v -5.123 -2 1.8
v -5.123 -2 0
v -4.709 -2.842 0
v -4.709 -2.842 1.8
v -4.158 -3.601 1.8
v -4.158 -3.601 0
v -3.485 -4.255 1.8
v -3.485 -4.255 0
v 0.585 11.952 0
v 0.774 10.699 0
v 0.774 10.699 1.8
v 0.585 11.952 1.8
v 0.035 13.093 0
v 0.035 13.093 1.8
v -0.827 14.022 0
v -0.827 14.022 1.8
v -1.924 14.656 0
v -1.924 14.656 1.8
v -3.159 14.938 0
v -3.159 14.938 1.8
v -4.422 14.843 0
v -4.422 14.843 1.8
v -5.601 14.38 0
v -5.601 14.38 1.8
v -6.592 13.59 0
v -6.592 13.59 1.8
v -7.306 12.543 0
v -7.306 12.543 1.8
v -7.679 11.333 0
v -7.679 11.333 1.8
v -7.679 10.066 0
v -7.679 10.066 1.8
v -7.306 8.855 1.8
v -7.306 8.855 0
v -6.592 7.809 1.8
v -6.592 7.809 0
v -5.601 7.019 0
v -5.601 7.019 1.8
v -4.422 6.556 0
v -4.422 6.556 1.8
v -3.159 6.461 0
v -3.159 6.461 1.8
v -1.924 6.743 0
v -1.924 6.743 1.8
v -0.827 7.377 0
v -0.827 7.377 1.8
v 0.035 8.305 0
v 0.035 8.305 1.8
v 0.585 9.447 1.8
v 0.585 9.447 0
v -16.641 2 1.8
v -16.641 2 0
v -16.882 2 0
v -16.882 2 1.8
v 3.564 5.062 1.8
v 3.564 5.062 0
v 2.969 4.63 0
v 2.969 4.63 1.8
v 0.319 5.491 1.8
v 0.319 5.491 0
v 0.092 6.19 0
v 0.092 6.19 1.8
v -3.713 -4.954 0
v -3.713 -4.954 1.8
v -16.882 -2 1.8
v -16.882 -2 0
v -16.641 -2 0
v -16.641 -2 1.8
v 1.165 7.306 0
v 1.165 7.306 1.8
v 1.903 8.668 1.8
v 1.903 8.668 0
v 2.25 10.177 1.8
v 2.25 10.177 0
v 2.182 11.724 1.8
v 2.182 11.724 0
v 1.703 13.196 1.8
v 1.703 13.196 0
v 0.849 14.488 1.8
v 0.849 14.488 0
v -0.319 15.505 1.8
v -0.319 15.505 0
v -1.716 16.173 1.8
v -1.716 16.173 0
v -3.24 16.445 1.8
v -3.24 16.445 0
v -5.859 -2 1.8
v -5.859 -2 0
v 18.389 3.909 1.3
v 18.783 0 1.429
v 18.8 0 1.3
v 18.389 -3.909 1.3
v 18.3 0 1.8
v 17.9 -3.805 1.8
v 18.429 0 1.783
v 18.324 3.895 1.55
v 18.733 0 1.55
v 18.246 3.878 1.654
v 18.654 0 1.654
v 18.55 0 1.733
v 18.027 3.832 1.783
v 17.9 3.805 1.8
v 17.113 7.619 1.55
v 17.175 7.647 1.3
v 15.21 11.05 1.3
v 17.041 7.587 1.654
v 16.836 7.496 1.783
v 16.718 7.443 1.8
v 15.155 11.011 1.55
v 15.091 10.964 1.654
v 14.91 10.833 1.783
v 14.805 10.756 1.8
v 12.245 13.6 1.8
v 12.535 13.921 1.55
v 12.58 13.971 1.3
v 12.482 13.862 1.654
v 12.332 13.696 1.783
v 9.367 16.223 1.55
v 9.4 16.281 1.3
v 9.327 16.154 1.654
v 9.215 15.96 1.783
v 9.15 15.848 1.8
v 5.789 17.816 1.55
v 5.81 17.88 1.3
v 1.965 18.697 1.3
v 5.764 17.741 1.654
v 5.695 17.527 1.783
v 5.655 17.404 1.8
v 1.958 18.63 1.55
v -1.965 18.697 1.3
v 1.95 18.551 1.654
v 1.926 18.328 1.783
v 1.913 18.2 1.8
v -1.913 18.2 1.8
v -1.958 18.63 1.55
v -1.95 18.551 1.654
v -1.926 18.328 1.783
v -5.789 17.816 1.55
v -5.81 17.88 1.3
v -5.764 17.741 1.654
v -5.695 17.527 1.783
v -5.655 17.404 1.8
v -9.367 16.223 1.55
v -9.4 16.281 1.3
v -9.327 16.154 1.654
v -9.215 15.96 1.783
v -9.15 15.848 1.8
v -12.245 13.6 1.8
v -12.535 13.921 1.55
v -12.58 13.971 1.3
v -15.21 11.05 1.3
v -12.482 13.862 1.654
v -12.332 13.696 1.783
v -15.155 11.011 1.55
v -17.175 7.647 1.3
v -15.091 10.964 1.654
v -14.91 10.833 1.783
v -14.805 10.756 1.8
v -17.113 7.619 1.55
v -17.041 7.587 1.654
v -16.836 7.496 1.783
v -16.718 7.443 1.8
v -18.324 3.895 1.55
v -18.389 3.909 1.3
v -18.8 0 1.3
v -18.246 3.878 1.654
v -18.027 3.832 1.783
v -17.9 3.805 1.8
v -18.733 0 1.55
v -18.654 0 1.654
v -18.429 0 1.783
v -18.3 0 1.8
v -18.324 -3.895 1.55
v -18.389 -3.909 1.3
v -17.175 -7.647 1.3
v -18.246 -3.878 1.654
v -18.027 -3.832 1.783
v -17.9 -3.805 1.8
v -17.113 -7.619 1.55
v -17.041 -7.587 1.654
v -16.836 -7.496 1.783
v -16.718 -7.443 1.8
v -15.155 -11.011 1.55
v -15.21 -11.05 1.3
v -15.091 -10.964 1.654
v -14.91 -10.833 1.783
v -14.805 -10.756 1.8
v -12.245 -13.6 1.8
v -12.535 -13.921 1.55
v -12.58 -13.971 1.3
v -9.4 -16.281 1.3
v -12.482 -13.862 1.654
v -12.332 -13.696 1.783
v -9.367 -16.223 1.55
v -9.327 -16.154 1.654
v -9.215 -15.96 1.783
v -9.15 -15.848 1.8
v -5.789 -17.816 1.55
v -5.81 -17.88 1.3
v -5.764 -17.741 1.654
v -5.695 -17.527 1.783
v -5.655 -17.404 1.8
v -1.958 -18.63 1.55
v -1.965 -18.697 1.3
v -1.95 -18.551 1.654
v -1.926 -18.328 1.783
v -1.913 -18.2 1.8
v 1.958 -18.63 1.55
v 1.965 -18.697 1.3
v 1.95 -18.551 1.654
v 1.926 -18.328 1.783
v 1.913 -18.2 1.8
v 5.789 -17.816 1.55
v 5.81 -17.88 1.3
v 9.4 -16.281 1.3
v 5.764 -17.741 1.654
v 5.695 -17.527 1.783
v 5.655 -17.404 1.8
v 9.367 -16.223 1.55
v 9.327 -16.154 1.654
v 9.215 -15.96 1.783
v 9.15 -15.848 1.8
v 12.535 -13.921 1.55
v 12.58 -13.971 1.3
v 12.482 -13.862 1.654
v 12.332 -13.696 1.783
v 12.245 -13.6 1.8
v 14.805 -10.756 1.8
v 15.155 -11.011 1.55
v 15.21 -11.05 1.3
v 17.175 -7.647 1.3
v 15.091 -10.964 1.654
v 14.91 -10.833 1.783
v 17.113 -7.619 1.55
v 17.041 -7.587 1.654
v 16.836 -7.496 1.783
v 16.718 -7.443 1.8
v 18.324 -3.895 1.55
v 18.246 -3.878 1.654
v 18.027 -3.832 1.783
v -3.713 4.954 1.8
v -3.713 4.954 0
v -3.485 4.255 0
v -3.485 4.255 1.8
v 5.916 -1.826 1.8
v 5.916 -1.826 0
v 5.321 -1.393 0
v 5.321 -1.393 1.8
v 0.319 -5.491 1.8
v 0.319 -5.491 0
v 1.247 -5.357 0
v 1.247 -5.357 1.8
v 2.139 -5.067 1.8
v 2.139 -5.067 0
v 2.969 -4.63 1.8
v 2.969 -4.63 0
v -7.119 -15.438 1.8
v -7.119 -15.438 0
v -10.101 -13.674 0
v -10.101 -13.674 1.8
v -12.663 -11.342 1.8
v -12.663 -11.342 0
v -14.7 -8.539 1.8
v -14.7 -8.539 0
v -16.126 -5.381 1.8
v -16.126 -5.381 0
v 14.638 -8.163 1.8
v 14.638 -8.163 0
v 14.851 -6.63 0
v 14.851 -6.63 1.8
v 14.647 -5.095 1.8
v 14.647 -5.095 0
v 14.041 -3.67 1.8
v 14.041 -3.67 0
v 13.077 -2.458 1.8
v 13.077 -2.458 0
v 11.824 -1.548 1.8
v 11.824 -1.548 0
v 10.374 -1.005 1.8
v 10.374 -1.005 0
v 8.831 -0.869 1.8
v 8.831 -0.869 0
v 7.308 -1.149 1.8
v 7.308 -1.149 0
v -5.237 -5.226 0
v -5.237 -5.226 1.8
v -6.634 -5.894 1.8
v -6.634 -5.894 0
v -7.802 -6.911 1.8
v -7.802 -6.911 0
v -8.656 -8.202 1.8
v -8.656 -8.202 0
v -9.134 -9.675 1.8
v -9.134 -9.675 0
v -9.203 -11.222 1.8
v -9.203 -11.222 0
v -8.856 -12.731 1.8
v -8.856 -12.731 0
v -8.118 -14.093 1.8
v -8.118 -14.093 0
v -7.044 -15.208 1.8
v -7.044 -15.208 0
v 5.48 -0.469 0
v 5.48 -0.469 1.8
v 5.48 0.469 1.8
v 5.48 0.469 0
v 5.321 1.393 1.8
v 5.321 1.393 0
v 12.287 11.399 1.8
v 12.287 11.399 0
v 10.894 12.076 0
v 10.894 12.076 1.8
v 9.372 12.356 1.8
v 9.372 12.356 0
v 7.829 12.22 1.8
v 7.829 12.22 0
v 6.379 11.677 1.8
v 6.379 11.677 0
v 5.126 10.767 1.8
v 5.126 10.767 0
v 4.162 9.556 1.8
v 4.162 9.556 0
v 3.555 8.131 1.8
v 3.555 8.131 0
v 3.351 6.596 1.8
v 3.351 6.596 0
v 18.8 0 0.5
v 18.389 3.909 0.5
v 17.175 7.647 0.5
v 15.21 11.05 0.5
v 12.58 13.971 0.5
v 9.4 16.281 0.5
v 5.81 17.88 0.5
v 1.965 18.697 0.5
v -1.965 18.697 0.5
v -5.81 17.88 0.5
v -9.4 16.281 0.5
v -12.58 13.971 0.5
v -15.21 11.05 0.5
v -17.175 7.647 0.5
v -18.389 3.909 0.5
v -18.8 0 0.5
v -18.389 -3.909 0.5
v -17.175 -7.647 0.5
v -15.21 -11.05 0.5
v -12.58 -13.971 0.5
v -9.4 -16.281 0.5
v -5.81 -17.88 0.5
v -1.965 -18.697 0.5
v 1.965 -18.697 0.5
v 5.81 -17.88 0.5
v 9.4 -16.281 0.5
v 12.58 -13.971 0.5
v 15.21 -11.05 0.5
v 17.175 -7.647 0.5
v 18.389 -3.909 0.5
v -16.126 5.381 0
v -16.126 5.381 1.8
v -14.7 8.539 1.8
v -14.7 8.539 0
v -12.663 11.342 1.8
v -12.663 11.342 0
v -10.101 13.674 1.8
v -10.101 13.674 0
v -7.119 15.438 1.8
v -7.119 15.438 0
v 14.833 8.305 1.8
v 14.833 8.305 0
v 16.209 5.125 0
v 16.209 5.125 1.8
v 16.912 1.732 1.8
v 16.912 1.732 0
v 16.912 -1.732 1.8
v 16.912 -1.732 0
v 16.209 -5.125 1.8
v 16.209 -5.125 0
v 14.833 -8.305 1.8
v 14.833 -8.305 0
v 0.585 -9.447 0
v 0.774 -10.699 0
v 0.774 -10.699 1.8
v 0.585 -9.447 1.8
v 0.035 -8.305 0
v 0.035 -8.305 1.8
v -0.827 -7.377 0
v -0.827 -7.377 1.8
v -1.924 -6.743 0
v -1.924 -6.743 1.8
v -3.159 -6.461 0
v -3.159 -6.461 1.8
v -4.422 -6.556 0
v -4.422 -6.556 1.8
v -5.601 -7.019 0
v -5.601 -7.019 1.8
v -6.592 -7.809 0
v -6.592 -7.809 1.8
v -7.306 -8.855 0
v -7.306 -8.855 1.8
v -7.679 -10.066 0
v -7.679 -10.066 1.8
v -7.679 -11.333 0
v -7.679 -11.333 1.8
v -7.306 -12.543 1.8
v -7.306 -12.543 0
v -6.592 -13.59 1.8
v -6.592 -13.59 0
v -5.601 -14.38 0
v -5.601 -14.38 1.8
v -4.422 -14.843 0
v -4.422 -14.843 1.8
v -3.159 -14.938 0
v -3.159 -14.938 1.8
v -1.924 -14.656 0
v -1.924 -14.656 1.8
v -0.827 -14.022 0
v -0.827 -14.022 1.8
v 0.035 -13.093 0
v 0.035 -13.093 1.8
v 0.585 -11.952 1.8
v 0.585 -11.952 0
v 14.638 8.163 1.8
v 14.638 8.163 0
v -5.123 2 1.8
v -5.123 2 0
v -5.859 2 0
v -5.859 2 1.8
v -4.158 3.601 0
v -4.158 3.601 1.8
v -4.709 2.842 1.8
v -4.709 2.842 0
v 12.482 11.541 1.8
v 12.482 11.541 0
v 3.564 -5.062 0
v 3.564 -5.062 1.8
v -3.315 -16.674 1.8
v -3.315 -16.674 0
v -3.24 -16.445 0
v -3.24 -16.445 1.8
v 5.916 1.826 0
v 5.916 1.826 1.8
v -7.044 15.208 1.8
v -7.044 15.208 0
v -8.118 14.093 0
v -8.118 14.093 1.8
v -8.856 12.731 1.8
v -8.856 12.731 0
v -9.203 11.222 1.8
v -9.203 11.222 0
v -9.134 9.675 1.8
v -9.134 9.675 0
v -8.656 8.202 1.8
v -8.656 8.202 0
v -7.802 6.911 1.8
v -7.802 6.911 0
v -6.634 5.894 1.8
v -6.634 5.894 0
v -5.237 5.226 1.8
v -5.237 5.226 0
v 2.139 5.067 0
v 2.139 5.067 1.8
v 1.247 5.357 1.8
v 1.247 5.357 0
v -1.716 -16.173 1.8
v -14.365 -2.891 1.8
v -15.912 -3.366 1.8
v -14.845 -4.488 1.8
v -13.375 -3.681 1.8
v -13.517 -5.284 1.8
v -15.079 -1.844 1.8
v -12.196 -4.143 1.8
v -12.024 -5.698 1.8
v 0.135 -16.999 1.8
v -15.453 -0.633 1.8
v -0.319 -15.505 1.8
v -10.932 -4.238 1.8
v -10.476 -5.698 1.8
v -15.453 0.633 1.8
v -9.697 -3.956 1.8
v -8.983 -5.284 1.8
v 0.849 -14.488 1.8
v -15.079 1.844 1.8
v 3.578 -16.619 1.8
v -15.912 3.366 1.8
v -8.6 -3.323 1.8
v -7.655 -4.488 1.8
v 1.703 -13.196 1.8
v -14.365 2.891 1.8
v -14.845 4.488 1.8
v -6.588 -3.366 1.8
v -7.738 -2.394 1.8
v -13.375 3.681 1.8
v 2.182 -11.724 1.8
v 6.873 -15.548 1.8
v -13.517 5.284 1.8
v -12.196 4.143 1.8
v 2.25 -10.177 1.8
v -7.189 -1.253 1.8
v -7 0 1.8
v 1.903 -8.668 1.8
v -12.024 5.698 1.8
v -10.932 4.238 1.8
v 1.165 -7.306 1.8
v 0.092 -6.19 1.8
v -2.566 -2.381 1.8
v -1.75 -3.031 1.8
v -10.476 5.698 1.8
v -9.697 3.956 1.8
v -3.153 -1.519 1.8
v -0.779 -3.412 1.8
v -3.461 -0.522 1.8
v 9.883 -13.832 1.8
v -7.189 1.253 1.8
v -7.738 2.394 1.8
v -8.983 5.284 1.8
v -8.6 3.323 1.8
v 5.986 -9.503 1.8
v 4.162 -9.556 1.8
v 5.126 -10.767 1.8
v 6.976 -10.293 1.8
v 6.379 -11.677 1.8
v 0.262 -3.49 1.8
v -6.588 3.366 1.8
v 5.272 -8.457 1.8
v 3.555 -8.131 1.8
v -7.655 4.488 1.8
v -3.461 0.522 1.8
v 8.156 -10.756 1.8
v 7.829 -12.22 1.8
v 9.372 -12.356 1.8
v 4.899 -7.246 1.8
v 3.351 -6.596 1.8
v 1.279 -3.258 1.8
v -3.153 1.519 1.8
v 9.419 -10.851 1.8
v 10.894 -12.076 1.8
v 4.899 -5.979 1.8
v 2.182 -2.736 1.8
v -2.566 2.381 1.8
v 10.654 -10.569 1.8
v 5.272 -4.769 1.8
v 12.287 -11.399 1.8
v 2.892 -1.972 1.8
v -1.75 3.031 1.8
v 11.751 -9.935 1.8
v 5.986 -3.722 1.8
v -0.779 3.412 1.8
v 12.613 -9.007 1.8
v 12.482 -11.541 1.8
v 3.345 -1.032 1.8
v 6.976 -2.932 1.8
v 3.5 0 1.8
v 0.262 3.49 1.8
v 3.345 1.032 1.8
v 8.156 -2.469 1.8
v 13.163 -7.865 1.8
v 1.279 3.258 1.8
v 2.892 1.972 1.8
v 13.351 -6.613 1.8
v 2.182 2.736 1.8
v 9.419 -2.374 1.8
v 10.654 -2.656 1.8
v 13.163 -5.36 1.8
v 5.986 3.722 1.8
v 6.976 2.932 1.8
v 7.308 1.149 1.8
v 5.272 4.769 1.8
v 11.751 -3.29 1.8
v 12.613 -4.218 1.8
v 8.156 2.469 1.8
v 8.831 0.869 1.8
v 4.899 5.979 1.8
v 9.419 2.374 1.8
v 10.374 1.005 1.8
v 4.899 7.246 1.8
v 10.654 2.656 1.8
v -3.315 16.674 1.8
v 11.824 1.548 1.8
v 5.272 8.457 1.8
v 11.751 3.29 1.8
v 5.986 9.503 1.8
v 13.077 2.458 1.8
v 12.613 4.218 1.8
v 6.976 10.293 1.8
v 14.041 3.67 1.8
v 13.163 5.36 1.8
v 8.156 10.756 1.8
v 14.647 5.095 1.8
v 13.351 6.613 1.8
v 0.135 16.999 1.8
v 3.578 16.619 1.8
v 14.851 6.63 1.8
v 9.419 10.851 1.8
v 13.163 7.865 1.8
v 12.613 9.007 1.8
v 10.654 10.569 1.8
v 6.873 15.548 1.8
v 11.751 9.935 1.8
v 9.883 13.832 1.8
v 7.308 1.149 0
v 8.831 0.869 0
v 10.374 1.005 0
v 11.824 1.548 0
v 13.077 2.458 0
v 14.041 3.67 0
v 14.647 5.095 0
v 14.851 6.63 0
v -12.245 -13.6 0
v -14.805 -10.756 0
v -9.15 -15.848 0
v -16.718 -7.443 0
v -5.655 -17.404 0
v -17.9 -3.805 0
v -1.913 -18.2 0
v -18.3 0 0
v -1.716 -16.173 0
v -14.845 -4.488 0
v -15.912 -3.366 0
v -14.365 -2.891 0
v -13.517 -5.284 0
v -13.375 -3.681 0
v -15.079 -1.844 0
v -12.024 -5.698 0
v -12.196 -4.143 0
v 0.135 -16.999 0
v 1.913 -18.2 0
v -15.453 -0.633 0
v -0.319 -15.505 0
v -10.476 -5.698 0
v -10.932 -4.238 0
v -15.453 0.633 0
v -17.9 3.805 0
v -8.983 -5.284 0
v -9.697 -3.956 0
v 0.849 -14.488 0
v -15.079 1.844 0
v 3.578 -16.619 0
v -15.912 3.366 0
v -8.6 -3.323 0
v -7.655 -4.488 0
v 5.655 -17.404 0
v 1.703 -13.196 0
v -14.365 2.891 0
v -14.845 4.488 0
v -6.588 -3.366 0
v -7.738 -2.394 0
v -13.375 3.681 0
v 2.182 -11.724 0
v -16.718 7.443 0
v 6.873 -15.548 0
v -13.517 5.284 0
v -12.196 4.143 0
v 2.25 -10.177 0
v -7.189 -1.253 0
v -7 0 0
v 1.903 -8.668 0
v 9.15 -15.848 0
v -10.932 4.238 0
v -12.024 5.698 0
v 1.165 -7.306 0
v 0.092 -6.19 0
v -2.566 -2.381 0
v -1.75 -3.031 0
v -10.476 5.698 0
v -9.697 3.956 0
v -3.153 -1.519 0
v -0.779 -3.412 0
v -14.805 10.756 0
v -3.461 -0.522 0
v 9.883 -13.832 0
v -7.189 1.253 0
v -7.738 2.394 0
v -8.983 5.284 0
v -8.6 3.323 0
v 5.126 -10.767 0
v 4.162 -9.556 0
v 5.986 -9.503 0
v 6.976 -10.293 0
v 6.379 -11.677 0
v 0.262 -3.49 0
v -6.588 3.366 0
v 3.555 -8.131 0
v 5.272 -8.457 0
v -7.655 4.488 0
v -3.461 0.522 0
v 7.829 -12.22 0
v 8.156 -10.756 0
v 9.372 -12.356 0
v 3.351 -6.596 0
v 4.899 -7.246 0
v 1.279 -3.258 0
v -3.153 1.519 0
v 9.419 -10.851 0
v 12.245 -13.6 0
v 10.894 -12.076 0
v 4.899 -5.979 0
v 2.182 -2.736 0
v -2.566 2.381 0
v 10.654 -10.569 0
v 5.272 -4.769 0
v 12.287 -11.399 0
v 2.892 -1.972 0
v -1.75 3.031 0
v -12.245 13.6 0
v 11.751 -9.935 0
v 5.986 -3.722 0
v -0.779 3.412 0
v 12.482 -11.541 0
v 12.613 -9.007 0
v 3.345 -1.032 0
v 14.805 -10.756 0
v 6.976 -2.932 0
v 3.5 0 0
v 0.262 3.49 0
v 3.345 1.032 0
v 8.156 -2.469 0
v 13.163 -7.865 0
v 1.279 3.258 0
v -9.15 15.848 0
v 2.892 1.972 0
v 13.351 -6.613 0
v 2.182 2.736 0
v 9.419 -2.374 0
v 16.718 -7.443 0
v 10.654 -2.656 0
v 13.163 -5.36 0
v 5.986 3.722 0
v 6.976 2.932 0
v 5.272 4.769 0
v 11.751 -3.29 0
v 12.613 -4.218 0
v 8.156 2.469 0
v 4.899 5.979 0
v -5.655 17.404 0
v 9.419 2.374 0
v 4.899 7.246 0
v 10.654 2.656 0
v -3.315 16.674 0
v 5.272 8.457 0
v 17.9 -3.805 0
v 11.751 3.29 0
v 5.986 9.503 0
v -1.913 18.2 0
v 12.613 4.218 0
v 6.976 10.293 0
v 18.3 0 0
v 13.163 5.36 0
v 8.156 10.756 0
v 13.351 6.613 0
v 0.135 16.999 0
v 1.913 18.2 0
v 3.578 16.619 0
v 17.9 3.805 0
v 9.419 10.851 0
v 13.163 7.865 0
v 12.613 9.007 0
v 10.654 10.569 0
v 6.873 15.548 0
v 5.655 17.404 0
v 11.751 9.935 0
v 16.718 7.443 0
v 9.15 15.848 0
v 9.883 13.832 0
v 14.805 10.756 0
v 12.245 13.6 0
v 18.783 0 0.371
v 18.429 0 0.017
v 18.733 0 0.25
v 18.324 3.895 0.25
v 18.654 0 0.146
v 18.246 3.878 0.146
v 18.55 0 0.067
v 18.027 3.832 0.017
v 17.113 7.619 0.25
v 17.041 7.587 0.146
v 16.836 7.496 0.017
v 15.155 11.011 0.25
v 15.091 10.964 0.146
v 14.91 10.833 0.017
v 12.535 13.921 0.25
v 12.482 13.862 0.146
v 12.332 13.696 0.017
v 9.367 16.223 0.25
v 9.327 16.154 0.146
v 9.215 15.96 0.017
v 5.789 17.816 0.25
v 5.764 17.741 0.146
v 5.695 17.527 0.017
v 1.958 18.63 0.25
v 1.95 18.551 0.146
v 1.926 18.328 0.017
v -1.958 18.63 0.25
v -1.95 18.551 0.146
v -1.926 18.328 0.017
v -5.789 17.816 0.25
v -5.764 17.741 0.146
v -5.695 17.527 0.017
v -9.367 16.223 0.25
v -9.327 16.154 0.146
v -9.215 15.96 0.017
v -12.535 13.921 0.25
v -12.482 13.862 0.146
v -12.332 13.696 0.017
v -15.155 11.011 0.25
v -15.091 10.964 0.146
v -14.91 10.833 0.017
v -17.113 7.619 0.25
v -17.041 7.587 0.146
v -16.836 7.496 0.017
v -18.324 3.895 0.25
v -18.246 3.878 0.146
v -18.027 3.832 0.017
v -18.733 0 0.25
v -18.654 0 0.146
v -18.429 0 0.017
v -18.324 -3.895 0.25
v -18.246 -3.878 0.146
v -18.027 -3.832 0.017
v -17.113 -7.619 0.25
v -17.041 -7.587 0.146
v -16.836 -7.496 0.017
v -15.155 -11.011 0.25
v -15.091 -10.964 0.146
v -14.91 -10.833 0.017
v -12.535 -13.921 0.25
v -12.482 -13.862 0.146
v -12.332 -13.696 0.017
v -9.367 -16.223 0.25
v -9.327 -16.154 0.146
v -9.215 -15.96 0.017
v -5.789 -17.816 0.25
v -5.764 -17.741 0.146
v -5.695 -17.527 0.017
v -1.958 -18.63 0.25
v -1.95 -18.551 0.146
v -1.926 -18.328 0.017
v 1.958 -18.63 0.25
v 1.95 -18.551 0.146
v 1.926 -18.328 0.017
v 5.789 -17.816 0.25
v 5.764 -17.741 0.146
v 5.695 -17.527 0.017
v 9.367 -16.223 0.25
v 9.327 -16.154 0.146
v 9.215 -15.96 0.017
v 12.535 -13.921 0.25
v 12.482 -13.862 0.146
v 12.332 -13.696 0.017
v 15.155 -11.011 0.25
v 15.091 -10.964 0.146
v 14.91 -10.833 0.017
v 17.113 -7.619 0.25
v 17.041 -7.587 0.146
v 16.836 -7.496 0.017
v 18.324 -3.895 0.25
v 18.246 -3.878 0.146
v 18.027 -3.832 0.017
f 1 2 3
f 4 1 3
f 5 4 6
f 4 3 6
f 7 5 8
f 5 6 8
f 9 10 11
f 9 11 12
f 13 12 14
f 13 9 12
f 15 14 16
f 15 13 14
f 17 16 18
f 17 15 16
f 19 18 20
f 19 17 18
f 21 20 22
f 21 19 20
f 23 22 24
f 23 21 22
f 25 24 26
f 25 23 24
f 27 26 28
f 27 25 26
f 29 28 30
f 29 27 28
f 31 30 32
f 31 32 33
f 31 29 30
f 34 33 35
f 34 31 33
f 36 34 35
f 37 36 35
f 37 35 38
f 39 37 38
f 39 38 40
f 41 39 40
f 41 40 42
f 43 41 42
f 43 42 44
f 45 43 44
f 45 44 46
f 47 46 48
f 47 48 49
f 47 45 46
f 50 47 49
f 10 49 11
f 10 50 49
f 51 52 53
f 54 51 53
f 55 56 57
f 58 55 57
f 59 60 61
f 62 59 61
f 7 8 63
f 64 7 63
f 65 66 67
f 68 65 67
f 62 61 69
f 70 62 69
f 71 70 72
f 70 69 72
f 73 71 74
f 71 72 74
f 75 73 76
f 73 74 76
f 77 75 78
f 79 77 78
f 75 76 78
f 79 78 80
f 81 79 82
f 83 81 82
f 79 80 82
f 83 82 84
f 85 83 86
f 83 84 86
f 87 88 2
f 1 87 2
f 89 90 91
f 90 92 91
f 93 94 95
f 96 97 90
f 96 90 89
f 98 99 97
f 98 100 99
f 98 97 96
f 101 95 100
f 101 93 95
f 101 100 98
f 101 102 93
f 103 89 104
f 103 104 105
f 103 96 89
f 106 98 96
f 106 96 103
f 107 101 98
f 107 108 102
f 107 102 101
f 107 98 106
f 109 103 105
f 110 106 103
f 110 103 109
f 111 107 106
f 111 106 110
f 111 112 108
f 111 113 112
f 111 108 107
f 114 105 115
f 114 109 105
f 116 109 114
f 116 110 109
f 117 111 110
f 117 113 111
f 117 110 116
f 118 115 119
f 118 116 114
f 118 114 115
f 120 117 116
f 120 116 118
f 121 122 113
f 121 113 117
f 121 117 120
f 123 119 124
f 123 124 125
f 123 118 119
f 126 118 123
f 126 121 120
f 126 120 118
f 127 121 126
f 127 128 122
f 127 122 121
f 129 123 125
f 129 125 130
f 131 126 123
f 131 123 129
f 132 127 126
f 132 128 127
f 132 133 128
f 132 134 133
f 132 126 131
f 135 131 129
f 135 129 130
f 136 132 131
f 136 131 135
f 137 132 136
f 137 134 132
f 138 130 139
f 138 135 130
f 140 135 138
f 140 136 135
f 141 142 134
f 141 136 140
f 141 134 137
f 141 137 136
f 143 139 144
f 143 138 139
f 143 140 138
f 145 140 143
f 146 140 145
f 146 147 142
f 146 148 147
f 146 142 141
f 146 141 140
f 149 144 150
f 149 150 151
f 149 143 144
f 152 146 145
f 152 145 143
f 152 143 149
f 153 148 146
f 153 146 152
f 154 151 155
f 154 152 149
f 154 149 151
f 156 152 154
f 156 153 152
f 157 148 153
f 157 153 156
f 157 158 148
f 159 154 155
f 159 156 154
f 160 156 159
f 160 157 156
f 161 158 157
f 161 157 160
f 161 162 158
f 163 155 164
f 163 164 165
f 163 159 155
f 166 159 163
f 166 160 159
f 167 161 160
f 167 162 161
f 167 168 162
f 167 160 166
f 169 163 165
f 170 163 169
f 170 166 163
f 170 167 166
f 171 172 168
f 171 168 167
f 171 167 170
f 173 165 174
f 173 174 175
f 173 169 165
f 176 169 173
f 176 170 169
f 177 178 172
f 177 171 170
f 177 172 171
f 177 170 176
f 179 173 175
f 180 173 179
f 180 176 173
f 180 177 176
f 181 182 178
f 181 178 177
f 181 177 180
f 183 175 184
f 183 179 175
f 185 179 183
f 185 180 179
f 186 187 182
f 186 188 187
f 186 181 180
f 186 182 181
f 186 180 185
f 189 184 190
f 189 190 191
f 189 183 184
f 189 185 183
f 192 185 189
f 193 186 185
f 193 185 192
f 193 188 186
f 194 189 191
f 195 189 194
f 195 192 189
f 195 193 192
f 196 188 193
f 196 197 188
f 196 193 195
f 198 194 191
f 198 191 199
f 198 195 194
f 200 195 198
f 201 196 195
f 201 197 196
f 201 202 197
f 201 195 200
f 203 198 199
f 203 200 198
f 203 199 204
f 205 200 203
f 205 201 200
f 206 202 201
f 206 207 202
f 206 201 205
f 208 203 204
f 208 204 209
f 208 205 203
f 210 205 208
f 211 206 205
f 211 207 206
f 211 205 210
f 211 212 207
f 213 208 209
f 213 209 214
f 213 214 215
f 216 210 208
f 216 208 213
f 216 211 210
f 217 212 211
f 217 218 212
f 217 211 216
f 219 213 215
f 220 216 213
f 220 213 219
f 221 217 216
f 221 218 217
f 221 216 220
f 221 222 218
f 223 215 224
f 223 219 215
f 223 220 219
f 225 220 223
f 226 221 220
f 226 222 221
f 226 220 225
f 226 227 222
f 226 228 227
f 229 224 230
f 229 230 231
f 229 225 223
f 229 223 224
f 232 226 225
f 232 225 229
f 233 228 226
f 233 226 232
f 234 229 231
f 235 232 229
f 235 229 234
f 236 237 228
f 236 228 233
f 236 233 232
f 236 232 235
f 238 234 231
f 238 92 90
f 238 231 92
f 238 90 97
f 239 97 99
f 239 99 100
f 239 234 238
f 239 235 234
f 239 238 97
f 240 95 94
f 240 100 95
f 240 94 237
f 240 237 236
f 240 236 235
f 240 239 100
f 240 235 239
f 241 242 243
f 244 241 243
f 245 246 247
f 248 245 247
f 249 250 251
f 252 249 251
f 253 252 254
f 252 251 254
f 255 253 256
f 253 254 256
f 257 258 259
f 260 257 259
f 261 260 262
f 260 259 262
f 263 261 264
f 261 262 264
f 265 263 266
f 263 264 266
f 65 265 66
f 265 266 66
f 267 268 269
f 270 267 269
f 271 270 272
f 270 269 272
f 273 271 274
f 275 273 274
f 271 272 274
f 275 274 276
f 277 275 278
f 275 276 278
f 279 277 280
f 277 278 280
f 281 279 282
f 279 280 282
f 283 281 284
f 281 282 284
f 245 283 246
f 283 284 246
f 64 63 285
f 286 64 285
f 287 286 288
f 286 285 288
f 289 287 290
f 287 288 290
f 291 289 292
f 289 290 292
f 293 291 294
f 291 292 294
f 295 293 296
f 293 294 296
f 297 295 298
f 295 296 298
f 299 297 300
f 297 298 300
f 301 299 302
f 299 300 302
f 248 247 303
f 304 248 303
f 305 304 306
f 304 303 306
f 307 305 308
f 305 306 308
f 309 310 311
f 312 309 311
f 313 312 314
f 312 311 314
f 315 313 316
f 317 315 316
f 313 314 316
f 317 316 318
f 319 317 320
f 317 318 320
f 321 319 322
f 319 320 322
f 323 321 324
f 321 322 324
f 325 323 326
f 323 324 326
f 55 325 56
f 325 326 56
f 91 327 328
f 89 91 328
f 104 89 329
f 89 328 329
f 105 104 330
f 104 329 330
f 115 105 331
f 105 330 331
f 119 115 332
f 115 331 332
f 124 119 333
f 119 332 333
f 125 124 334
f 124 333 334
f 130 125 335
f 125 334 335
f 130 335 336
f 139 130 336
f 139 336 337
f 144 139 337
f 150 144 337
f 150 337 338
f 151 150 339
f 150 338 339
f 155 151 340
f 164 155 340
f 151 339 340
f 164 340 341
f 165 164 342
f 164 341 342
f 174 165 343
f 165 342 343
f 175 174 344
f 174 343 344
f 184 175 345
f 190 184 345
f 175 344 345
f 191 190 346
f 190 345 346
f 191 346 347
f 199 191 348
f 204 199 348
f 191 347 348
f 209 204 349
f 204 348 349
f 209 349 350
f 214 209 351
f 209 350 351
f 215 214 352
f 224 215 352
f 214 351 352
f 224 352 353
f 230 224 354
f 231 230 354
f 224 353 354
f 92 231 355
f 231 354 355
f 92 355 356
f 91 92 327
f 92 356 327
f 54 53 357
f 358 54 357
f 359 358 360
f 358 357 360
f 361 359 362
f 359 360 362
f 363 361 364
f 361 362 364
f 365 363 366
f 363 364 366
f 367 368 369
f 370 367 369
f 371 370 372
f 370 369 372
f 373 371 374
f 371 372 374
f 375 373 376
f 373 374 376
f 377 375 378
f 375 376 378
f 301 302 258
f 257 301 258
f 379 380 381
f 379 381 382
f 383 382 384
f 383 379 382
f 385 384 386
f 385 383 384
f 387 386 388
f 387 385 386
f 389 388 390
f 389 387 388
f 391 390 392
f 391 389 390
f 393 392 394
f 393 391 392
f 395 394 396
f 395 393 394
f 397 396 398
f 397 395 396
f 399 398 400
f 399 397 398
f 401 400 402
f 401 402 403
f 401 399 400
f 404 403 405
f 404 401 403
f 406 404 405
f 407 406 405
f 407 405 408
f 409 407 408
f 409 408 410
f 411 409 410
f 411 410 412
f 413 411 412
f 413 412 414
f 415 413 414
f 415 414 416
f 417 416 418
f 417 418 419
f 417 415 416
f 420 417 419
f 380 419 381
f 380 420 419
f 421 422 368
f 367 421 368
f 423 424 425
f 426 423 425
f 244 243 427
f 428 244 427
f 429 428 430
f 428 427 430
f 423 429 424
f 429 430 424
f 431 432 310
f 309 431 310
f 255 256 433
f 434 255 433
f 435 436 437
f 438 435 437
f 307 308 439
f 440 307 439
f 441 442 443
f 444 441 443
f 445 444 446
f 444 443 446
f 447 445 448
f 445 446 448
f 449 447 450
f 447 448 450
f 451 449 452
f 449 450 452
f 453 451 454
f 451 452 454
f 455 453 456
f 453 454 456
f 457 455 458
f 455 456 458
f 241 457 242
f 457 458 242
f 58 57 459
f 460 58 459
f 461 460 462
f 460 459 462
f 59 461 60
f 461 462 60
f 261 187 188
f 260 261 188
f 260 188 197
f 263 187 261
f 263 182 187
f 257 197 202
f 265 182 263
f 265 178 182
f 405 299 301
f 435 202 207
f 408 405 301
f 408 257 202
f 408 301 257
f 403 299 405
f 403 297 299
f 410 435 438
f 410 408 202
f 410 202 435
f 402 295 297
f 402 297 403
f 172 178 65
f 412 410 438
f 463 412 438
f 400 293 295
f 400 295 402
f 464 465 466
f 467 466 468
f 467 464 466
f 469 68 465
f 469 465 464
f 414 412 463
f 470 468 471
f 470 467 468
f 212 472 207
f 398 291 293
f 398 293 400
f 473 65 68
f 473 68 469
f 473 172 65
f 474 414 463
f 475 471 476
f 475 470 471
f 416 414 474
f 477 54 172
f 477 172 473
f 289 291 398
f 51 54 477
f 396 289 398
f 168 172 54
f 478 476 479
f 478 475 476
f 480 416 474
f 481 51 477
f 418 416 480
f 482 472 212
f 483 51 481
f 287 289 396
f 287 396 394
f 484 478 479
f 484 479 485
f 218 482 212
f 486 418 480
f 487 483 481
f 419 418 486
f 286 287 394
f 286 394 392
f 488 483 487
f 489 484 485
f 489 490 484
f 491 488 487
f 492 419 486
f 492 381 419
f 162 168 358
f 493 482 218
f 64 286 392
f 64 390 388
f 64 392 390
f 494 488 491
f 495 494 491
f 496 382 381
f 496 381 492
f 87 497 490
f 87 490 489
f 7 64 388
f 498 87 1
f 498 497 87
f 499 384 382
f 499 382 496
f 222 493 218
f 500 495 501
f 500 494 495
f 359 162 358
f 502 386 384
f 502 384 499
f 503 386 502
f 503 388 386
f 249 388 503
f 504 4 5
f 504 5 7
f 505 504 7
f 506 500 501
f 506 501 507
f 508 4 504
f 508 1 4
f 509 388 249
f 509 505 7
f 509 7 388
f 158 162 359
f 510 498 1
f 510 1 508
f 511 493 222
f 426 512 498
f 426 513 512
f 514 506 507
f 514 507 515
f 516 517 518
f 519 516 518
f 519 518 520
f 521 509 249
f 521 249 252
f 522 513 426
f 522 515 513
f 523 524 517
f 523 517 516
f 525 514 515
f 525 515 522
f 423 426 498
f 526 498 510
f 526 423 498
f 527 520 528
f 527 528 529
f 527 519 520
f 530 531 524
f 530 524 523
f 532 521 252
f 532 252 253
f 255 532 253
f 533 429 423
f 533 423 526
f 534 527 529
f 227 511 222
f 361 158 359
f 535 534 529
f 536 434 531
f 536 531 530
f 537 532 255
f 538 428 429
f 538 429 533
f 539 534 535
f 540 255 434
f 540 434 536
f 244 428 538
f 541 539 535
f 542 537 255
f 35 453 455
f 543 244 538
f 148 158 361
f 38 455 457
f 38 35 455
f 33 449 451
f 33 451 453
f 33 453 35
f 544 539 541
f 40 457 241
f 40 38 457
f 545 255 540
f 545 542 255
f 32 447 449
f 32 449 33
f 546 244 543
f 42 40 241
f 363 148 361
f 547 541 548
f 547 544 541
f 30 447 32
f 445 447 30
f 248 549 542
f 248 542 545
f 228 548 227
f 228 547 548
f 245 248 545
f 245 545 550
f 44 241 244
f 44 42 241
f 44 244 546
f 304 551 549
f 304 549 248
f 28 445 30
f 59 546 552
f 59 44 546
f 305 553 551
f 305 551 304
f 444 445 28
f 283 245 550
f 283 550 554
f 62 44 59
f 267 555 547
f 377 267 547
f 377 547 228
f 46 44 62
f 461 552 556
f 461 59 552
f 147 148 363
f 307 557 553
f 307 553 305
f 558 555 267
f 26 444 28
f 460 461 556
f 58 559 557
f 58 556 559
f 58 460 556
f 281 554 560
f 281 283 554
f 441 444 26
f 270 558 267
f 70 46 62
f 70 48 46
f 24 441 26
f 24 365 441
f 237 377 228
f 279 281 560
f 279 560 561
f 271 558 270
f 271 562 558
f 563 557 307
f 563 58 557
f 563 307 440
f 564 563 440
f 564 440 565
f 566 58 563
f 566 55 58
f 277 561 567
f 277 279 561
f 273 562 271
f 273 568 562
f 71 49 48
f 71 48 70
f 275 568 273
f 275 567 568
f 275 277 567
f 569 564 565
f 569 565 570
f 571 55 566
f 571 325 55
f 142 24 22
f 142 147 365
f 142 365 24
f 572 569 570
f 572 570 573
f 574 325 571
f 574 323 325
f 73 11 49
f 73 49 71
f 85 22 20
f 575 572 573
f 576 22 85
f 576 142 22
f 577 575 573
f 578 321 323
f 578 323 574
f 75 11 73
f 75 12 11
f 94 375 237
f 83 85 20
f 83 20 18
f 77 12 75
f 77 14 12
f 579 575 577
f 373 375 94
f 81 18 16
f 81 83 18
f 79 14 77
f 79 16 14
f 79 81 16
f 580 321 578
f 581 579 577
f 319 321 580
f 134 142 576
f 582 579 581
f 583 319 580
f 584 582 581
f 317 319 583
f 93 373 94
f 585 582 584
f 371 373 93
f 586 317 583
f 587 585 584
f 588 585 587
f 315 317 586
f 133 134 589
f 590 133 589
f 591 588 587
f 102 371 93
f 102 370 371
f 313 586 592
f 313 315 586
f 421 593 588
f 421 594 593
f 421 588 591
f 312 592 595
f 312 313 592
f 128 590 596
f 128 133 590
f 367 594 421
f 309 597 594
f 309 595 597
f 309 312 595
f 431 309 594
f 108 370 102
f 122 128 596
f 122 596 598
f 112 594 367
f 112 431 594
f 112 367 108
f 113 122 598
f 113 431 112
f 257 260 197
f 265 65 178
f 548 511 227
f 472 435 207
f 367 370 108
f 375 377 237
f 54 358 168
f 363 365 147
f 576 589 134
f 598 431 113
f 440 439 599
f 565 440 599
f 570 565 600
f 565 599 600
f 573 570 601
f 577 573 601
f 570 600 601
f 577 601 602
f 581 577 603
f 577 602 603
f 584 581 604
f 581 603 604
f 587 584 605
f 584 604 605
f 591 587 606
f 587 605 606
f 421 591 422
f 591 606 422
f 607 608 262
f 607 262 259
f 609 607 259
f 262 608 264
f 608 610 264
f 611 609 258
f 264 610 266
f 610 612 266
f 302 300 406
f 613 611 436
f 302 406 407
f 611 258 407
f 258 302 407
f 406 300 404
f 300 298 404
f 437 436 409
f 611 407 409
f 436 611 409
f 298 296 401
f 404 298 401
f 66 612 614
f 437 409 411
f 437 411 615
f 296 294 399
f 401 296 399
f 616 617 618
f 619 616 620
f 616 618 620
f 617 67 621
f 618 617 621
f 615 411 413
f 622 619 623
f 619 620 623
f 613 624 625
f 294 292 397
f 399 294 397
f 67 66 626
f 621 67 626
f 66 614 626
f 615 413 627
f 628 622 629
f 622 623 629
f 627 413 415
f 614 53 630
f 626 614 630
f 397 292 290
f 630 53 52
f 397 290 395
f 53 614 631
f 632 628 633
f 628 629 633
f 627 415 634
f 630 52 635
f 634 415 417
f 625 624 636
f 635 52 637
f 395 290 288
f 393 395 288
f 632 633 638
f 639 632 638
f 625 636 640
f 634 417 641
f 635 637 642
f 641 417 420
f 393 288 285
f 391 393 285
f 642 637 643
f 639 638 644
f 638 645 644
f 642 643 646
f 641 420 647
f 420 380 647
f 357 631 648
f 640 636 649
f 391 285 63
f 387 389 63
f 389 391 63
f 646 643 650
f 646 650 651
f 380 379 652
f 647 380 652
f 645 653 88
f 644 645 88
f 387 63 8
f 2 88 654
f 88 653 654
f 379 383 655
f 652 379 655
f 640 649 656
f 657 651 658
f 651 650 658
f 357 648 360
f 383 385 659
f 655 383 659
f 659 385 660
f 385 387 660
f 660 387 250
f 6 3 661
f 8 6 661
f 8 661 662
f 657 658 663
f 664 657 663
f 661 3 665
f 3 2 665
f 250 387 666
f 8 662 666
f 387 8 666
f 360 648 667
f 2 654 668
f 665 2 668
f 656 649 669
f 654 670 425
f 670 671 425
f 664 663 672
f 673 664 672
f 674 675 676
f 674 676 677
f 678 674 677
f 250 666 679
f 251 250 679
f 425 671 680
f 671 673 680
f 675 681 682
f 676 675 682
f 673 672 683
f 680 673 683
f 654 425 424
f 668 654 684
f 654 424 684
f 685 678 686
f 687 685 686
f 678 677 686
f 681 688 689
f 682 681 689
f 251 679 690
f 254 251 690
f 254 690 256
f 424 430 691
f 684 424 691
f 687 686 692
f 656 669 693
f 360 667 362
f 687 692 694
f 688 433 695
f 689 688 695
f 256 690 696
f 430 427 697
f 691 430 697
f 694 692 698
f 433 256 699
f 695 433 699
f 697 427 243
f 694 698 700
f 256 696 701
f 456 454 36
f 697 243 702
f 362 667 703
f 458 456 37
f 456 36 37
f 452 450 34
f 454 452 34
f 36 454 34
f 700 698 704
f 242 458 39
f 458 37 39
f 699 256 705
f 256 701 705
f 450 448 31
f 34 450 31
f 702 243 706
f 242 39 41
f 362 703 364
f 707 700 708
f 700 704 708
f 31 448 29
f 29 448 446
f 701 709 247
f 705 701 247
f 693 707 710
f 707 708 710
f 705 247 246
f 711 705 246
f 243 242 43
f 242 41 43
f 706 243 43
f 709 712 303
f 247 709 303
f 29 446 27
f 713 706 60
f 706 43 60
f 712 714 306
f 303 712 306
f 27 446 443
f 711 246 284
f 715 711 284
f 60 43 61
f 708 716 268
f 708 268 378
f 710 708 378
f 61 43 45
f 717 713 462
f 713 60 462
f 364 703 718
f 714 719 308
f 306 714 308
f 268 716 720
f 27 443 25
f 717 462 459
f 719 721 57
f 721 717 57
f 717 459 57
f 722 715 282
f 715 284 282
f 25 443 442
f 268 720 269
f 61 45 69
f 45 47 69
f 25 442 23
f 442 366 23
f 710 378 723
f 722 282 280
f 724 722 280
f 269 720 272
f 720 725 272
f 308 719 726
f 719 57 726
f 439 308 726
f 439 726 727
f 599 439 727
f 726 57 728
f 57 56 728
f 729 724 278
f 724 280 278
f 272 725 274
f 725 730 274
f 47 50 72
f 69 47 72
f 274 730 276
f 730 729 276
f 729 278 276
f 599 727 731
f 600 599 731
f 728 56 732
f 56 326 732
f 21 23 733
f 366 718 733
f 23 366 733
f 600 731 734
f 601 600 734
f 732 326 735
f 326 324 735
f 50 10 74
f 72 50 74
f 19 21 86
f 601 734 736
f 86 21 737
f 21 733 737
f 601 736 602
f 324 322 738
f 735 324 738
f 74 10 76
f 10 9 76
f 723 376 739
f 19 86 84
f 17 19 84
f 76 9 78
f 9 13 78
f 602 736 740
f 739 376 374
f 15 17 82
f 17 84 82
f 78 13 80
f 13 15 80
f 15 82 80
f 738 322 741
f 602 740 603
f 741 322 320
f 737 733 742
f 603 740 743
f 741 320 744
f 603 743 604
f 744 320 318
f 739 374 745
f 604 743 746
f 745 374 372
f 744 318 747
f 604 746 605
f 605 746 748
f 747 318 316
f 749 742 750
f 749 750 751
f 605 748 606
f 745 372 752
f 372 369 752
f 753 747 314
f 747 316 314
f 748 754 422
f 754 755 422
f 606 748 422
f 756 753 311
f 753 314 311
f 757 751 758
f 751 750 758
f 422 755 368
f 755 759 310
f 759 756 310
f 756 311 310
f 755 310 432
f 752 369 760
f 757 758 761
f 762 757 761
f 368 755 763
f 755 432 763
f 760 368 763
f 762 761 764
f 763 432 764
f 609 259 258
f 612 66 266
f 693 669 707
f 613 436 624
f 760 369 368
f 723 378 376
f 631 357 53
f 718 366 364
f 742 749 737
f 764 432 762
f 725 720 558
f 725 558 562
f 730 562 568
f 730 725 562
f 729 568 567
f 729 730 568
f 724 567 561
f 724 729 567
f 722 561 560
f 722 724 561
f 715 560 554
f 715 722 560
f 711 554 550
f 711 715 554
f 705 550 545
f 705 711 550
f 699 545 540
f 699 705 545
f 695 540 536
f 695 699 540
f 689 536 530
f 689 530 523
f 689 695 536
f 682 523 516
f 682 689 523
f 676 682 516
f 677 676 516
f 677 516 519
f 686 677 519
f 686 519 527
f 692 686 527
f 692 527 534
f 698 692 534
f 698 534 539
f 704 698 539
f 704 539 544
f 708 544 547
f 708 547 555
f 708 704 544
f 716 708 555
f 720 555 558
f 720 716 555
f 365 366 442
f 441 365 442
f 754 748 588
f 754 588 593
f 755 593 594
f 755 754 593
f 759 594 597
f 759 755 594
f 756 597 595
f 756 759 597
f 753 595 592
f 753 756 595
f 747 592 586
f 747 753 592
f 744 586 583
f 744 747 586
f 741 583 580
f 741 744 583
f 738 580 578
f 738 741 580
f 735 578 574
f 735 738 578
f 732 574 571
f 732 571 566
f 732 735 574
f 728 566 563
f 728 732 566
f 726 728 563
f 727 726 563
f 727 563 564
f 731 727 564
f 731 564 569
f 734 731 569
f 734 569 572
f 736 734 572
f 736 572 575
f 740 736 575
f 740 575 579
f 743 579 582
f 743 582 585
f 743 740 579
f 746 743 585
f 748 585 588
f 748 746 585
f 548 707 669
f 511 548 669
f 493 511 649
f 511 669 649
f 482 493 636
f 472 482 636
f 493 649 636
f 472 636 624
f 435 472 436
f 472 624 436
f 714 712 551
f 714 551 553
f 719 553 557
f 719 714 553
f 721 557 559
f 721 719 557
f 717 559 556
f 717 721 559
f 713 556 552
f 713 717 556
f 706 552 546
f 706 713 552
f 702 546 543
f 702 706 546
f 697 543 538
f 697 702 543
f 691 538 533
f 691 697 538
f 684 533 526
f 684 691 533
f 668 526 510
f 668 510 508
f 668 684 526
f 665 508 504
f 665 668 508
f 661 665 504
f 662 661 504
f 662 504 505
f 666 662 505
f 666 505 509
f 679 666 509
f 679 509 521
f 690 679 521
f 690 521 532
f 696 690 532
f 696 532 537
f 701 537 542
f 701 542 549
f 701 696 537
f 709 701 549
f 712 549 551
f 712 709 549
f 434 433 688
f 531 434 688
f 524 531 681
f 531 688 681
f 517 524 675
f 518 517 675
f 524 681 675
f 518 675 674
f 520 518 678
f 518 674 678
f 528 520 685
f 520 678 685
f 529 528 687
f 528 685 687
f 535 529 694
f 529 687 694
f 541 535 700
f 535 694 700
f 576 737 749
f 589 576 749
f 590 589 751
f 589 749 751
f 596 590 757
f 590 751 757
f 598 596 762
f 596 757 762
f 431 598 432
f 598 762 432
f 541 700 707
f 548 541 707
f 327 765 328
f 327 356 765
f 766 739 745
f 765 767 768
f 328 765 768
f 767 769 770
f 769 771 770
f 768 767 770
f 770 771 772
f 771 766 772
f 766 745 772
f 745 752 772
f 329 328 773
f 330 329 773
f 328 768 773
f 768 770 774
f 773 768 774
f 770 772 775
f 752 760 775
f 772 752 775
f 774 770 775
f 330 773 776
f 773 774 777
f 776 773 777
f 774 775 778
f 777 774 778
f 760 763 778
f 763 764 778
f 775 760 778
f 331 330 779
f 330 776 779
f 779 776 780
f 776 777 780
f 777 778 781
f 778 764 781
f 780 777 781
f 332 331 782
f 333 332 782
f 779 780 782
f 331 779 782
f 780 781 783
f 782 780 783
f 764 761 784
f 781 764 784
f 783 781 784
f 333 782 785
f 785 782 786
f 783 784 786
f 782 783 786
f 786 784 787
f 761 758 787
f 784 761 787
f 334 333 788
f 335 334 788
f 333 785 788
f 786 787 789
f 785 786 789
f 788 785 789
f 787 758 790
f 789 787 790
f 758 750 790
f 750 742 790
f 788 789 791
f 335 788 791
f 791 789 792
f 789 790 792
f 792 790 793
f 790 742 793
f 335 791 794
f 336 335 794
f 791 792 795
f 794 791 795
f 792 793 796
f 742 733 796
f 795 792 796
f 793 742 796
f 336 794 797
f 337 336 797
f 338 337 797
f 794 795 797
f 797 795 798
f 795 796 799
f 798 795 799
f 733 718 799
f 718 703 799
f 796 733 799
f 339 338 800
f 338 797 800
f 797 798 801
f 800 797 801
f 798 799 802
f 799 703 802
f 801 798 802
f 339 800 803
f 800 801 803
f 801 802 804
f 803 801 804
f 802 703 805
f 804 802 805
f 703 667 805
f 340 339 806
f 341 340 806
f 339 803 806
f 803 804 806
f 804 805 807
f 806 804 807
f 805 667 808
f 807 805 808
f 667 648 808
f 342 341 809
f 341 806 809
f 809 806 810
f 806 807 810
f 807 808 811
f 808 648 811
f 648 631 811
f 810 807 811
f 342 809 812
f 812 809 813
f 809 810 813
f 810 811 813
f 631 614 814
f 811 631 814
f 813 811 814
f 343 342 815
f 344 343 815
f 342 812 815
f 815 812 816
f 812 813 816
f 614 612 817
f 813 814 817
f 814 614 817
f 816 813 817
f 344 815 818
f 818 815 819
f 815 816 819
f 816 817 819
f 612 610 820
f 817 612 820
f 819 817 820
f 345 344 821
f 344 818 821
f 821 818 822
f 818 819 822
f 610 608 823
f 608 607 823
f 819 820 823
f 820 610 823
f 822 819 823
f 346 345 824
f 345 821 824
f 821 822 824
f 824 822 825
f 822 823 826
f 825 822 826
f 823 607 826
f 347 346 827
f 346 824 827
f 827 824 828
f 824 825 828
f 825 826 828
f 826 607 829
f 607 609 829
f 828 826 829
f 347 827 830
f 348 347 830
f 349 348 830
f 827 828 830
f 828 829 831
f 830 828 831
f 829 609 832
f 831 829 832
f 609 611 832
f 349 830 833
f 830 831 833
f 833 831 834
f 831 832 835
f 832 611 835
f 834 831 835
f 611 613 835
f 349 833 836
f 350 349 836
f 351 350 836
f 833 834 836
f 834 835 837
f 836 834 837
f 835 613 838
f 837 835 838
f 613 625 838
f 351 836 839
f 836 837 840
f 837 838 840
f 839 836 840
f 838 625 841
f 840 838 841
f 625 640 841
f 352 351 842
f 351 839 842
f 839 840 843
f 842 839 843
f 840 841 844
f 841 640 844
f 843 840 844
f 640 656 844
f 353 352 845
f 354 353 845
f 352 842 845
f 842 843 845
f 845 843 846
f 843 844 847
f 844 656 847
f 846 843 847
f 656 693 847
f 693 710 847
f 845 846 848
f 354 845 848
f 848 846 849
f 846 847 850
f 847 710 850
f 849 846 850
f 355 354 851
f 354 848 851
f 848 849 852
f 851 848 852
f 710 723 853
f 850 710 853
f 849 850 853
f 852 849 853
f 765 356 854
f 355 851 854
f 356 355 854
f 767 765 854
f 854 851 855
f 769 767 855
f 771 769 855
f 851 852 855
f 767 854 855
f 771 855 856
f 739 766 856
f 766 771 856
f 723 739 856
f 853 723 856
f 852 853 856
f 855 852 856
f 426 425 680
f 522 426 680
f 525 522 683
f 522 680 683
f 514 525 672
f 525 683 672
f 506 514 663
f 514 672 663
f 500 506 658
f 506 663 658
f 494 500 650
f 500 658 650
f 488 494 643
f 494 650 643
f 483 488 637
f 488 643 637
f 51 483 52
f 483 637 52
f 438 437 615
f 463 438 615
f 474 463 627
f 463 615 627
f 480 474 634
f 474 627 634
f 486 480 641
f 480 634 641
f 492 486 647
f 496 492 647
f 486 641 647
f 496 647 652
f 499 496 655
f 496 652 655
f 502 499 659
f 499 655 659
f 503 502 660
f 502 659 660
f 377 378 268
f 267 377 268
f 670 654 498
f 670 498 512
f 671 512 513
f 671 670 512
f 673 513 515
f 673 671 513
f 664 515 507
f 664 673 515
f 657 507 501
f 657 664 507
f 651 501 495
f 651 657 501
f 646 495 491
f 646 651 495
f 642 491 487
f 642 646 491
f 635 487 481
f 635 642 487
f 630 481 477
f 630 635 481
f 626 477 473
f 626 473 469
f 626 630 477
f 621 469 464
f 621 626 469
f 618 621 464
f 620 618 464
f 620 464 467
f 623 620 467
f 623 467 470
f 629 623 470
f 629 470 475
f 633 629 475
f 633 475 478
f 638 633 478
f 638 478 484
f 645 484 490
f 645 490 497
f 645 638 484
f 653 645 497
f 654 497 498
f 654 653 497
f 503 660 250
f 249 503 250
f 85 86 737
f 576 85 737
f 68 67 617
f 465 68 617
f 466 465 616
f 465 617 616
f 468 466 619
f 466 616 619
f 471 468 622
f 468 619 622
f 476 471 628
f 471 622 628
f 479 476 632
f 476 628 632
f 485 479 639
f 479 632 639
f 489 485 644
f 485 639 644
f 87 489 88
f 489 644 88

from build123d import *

# Parameters (mm, degrees)
F0_R     = 18.8
F0_R_2   = 4.25
F0_R_3   = 3.5
F1_DEPTH = 1.8
F2_R     = 0.5


with BuildPart() as f1:
    # F0 (on Top) → F1 (new body)
    with BuildSketch(Plane.XY):
        Circle(F0_R)
        with Locations((-3.476441, -10.699386)):
            Circle(F0_R_2, mode=Mode.SUBTRACT)
        with BuildLine():
            Line((-3.485354, -4.254681), (-3.712655, -4.95424))
            ThreePointArc((-3.712655, -4.95424), (-8.945016, -8.922538), (-7.044454, -15.208464))
            Line((-7.044454, -15.208464), (-7.11892, -15.437648))
            ThreePointArc((-7.11892, -15.437648), (-13.753289, -9.992349), (-16.881943, -2))
            Line((-16.881943, -2), (-16.640965, -2))
            ThreePointArc((-16.640965, -2), (-11.25, -5.75), (-5.859035, -2))
            Line((-5.859035, -2), (-5.123475, -2))
            ThreePointArc((-5.123475, -2), (-4.449593, -3.232819), (-3.485354, -4.254681))
        make_face(mode=Mode.SUBTRACT)
        with BuildLine():
            ThreePointArc((12.482208, -11.540991), (5.253289, -16.167961), (-3.314694, -16.673716))
            Line((-3.314694, -16.673716), (-3.240228, -16.444532))
            ThreePointArc((-3.240228, -16.444532), (1.992134, -12.476234), (0.091572, -6.190308))
            Line((0.091572, -6.190308), (0.318872, -5.490749))
            ThreePointArc((0.318872, -5.490749), (1.699593, -5.230811), (2.969408, -4.629537))
            Line((2.969408, -4.629537), (3.564489, -5.061889))
            ThreePointArc((3.564489, -5.061889), (5.721676, -11.264432), (12.287253, -11.399348))
            Line((12.287253, -11.399348), (12.482208, -11.540991))
        make_face(mode=Mode.SUBTRACT)
        with Locations((9.101441, -6.612584)):
            Circle(F0_R_2, mode=Mode.SUBTRACT)
        with Locations((-11.25, 0)):
            Circle(F0_R_2, mode=Mode.SUBTRACT)
        with BuildLine():
            Line((-3.712655, 4.95424), (-3.485354, 4.254681))
            ThreePointArc((-3.485354, 4.254681), (-4.449593, 3.232819), (-5.123475, 2))
            Line((-5.123475, 2), (-5.859035, 2))
            ThreePointArc((-5.859035, 2), (-11.25, 5.75), (-16.640965, 2))
            Line((-16.640965, 2), (-16.881943, 2))
            ThreePointArc((-16.881943, 2), (-13.753289, 9.992349), (-7.11892, 15.437648))
            Line((-7.11892, 15.437648), (-7.044454, 15.208464))
            ThreePointArc((-7.044454, 15.208464), (-8.945016, 8.922538), (-3.712655, 4.95424))
        make_face(mode=Mode.SUBTRACT)
        with Locations((-3.476441, 10.699386)):
            Circle(F0_R_2, mode=Mode.SUBTRACT)
        Circle(F0_R_3, mode=Mode.SUBTRACT)
        with Locations((9.101441, 6.612584)):
            Circle(F0_R_2, mode=Mode.SUBTRACT)
        with BuildLine():
            Line((14.833349, -8.304923), (14.638394, -8.16328))
            ThreePointArc((14.638394, -8.16328), (12.481206, -1.960736), (5.91563, -1.825821))
            Line((5.91563, -1.825821), (5.320549, -1.393469))
            ThreePointArc((5.320549, -1.393469), (5.5, 0), (5.320549, 1.393469))
            Line((5.320549, 1.393469), (5.91563, 1.825821))
            ThreePointArc((5.91563, 1.825821), (12.481206, 1.960736), (14.638394, 8.16328))
            Line((14.638394, 8.16328), (14.833349, 8.304923))
            ThreePointArc((14.833349, 8.304923), (17, 0), (14.833349, -8.304923))
        make_face(mode=Mode.SUBTRACT)
        with BuildLine():
            ThreePointArc((-3.314694, 16.673716), (5.253289, 16.167961), (12.482208, 11.540991))
            Line((12.482208, 11.540991), (12.287253, 11.399348))
            ThreePointArc((12.287253, 11.399348), (5.721676, 11.264432), (3.564489, 5.061889))
            Line((3.564489, 5.061889), (2.969408, 4.629537))
            ThreePointArc((2.969408, 4.629537), (1.699593, 5.230811), (0.318872, 5.490749))
            Line((0.318872, 5.490749), (0.091572, 6.190308))
            ThreePointArc((0.091572, 6.190308), (1.992134, 12.476234), (-3.240228, 16.444532))
            Line((-3.240228, 16.444532), (-3.314694, 16.673716))
        make_face(mode=Mode.SUBTRACT)
    extrude(amount=F1_DEPTH)

    # F2
    f2_edges = [f1.edges().sort_by_distance(p)[0] for p in [
        (-18.8, 0, 1.8),
        (-18.8, 0, 0),
    ]]
    fillet(f2_edges, radius=F2_R)


solid = f1.part
